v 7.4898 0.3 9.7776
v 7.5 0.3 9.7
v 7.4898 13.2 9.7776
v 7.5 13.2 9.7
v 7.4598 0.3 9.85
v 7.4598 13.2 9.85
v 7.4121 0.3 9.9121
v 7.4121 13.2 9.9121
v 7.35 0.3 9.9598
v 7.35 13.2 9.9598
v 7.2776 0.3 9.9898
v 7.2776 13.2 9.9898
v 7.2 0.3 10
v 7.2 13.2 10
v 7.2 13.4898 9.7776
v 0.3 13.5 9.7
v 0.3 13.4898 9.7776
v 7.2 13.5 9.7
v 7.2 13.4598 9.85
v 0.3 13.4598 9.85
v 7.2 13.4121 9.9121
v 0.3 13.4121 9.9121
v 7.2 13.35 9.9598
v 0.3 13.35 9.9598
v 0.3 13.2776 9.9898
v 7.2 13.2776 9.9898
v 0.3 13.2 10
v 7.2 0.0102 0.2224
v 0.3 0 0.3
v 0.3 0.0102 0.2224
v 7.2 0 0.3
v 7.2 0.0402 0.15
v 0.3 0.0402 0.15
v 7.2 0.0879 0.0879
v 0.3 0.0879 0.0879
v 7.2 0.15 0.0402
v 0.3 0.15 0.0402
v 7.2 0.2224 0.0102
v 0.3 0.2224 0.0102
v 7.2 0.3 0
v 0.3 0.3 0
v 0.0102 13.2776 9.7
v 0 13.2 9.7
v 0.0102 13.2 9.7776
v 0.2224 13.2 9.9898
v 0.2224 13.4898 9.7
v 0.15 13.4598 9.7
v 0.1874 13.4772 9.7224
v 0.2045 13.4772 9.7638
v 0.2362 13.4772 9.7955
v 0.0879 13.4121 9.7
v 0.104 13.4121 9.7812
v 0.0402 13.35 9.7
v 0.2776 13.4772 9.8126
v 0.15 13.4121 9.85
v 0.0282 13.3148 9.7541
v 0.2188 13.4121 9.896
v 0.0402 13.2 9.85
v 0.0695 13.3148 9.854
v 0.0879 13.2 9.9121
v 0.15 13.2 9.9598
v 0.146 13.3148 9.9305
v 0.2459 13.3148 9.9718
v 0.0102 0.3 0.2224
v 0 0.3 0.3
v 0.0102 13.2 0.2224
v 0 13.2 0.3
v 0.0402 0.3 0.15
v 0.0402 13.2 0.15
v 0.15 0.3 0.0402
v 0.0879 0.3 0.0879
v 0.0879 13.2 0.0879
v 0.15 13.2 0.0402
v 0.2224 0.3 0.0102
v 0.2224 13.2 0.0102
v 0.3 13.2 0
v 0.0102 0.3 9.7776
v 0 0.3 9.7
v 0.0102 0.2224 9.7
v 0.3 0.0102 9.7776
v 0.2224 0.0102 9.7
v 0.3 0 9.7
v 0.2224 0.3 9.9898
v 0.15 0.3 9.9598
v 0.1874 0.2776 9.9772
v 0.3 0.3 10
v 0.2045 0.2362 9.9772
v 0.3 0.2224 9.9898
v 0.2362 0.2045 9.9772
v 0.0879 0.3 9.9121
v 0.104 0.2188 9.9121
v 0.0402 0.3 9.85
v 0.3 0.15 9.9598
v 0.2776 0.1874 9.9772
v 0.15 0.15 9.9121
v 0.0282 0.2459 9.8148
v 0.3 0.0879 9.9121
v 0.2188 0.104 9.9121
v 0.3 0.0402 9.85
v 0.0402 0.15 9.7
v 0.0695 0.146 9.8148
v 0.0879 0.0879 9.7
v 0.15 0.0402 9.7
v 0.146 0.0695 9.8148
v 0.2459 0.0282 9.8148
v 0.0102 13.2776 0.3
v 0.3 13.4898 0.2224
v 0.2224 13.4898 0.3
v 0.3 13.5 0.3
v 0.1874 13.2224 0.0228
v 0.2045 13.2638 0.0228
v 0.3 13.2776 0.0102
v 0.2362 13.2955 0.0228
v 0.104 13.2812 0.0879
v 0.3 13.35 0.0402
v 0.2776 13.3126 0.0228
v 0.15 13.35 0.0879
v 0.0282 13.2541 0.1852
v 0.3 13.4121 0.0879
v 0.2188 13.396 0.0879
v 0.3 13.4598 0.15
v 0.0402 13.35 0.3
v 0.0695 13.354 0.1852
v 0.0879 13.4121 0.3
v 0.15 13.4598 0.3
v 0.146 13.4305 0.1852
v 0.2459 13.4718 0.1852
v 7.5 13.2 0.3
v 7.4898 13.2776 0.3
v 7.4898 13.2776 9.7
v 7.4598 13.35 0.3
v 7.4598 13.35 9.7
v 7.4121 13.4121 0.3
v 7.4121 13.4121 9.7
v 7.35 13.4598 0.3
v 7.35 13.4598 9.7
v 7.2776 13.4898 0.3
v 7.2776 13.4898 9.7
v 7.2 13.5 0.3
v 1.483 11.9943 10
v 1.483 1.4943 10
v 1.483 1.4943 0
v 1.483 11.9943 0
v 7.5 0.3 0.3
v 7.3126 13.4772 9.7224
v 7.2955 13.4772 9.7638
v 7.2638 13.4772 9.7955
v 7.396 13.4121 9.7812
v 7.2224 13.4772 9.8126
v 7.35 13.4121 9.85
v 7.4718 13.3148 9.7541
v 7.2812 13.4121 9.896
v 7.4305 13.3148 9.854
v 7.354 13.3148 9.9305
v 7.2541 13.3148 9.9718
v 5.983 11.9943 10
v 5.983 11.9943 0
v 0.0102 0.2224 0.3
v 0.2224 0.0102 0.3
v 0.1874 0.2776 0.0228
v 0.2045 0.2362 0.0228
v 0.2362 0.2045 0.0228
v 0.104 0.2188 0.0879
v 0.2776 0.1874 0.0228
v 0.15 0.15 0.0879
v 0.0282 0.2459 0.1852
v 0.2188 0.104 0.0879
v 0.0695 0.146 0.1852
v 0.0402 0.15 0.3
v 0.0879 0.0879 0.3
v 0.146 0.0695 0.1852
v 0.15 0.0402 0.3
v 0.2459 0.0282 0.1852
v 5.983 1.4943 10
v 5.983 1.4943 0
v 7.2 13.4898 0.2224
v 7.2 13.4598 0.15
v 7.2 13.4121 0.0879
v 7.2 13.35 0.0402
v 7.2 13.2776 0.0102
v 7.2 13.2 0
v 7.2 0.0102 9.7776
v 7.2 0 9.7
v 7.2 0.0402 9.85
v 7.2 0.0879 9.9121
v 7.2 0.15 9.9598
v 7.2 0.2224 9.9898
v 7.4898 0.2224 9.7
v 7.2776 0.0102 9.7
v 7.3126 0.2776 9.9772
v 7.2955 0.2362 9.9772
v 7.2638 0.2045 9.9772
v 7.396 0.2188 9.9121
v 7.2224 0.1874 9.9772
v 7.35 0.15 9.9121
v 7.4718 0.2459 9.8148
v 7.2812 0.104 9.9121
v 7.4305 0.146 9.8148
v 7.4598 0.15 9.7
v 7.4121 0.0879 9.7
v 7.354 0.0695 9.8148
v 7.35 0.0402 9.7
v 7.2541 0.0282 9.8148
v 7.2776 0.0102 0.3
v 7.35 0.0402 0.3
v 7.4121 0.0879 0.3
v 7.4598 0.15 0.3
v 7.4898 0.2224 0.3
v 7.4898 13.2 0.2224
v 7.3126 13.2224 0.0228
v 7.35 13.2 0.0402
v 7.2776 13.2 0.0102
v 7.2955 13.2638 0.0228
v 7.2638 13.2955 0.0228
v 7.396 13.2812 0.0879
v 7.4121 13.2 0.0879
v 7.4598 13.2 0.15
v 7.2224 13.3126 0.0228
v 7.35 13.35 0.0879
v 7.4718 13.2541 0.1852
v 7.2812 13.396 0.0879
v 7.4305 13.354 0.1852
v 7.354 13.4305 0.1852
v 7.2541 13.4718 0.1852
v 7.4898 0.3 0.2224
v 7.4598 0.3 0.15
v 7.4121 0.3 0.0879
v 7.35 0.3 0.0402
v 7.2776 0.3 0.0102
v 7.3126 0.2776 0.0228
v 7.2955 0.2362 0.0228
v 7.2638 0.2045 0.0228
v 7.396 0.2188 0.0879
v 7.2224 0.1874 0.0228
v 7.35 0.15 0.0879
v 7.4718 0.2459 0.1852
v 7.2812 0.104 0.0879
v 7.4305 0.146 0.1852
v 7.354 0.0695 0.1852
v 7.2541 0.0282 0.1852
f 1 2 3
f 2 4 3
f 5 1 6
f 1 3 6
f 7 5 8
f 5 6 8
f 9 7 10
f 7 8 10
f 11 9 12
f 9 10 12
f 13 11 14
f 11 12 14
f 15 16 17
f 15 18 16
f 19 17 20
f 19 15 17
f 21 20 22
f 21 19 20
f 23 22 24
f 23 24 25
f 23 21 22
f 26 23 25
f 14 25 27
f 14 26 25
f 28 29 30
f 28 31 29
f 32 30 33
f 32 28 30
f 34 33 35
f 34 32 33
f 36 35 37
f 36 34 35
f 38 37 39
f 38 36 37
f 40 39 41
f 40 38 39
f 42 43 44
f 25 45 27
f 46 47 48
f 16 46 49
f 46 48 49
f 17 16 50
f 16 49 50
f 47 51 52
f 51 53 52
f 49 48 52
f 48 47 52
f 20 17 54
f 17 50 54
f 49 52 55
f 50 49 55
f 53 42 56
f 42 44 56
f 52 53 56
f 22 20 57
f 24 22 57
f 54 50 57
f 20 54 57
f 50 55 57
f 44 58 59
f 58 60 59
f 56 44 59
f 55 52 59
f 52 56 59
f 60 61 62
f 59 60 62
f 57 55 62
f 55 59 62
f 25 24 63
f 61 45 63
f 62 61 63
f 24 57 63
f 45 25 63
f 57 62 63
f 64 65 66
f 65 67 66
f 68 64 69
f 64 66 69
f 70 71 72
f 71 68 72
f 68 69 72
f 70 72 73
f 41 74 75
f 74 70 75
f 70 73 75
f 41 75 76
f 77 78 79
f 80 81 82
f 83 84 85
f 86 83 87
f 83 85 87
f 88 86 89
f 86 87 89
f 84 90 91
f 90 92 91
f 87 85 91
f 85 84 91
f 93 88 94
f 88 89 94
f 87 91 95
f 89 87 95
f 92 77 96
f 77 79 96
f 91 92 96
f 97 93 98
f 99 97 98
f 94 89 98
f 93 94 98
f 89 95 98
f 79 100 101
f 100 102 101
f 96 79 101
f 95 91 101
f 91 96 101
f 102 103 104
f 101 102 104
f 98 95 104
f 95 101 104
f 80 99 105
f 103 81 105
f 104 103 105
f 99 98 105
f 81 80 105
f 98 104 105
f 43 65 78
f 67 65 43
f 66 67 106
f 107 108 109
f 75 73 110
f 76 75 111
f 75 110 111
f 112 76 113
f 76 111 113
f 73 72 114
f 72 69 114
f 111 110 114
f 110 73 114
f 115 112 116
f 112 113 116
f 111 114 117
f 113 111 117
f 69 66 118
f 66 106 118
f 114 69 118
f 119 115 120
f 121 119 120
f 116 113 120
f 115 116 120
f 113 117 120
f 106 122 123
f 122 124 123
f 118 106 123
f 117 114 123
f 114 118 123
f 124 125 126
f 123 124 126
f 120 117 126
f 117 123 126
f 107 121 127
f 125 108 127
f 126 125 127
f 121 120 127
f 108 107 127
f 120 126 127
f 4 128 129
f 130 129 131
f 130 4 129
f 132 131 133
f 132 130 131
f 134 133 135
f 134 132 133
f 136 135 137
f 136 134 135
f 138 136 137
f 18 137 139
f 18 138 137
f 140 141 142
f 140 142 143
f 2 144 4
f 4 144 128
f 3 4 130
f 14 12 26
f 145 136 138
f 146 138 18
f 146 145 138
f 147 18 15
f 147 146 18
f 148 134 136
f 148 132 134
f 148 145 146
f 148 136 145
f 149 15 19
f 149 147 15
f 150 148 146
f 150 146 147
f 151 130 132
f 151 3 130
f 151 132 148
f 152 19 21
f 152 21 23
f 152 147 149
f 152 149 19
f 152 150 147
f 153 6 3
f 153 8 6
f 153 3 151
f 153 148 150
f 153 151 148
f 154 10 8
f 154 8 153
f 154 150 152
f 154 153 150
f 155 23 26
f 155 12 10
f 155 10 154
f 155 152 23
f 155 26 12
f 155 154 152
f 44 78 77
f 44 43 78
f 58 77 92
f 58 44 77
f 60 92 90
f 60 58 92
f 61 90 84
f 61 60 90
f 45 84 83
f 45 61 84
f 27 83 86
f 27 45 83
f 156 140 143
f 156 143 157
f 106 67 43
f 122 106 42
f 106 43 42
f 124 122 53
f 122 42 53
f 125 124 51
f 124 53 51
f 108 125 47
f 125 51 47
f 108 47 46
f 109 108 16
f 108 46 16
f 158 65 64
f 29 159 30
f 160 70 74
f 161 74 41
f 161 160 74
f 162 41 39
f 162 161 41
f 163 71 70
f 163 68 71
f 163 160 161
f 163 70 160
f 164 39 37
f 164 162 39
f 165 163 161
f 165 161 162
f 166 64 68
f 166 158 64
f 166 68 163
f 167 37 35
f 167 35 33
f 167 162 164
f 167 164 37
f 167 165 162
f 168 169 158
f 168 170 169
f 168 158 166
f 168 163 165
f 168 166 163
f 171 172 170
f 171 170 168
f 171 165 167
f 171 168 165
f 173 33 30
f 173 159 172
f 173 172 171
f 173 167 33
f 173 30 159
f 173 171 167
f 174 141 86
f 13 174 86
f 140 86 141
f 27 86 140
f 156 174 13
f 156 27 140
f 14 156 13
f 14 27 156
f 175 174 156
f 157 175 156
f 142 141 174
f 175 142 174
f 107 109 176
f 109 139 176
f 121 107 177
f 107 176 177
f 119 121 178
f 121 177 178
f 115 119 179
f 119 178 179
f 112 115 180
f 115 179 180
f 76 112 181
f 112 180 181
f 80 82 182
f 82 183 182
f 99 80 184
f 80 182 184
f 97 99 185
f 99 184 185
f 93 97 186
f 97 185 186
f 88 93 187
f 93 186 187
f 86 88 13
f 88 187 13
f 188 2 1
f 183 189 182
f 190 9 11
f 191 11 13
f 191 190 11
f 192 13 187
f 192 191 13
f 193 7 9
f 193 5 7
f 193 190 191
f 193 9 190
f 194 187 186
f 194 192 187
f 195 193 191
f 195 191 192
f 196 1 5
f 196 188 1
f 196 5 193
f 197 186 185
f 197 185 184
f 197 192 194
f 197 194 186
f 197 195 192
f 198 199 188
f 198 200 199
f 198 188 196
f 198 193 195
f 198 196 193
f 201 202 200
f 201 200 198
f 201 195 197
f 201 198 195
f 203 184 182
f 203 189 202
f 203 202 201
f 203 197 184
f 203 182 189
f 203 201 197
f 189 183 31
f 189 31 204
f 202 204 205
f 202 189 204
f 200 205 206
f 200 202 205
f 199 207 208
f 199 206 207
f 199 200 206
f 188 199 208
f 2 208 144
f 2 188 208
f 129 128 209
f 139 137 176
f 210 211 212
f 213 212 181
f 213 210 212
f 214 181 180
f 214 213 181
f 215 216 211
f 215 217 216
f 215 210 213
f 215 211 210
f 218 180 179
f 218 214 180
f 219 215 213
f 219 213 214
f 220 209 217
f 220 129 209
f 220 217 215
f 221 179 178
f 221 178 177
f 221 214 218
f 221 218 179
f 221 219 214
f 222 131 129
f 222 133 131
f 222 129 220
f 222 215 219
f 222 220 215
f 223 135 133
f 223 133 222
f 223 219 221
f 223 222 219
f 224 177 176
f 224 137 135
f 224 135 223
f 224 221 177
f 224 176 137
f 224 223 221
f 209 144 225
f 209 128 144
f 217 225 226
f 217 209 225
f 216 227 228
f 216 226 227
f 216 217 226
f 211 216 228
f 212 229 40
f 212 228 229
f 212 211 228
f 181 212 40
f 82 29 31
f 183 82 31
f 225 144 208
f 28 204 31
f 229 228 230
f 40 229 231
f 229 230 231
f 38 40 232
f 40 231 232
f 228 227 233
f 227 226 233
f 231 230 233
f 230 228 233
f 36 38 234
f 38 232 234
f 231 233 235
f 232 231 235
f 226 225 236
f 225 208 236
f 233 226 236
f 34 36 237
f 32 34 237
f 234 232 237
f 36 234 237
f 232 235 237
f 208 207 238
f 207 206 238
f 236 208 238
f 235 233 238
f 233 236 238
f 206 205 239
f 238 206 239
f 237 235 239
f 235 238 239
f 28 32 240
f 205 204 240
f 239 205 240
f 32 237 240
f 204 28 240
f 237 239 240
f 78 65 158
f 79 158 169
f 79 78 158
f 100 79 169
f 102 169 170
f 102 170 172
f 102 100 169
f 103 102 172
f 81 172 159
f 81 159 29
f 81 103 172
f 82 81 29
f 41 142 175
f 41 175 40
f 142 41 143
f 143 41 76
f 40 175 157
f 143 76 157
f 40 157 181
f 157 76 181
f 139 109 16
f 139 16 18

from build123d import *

# Parameters (mm, degrees)
BOX_W        = 7.5
BOX_H        = 13.5
BOX_DEPTH    = 10
FILLET_R     = 0.3
SKETCH_W     = 4.5
SKETCH_H     = 10.5
POCKET_DEPTH = 10


with BuildPart() as part:
    # Box → Box (new body)
    with BuildSketch(Plane.XY):
        with Locations((3.75, 6.75)):
            Rectangle(BOX_W, BOX_H)
    extrude(amount=BOX_DEPTH)

    # Fillet
    fillet_edges = [part.edges().sort_by_distance(p)[0] for p in [
        (0, 0, 5),
        (0, 6.75, 10),
        (0, 13.5, 5),
        (0, 6.75, 0),
        (7.5, 0, 5),
        (7.5, 6.75, 10),
        (7.5, 13.5, 5),
        (7.5, 6.75, 0),
        (3.75, 0, 0),
        (3.75, 0, 10),
        (3.75, 13.5, 0),
        (3.75, 13.5, 10),
    ]]
    fillet(fillet_edges, radius=FILLET_R)

    # Sketch (on Face6 of Box) → Pocket (cut)
    with BuildSketch(Plane.XY.offset(10)):
        with Locations((3.733011, 6.744313)):
            Rectangle(SKETCH_W, SKETCH_H)
    extrude(amount=-POCKET_DEPTH, mode=Mode.SUBTRACT)


solid = part.part
